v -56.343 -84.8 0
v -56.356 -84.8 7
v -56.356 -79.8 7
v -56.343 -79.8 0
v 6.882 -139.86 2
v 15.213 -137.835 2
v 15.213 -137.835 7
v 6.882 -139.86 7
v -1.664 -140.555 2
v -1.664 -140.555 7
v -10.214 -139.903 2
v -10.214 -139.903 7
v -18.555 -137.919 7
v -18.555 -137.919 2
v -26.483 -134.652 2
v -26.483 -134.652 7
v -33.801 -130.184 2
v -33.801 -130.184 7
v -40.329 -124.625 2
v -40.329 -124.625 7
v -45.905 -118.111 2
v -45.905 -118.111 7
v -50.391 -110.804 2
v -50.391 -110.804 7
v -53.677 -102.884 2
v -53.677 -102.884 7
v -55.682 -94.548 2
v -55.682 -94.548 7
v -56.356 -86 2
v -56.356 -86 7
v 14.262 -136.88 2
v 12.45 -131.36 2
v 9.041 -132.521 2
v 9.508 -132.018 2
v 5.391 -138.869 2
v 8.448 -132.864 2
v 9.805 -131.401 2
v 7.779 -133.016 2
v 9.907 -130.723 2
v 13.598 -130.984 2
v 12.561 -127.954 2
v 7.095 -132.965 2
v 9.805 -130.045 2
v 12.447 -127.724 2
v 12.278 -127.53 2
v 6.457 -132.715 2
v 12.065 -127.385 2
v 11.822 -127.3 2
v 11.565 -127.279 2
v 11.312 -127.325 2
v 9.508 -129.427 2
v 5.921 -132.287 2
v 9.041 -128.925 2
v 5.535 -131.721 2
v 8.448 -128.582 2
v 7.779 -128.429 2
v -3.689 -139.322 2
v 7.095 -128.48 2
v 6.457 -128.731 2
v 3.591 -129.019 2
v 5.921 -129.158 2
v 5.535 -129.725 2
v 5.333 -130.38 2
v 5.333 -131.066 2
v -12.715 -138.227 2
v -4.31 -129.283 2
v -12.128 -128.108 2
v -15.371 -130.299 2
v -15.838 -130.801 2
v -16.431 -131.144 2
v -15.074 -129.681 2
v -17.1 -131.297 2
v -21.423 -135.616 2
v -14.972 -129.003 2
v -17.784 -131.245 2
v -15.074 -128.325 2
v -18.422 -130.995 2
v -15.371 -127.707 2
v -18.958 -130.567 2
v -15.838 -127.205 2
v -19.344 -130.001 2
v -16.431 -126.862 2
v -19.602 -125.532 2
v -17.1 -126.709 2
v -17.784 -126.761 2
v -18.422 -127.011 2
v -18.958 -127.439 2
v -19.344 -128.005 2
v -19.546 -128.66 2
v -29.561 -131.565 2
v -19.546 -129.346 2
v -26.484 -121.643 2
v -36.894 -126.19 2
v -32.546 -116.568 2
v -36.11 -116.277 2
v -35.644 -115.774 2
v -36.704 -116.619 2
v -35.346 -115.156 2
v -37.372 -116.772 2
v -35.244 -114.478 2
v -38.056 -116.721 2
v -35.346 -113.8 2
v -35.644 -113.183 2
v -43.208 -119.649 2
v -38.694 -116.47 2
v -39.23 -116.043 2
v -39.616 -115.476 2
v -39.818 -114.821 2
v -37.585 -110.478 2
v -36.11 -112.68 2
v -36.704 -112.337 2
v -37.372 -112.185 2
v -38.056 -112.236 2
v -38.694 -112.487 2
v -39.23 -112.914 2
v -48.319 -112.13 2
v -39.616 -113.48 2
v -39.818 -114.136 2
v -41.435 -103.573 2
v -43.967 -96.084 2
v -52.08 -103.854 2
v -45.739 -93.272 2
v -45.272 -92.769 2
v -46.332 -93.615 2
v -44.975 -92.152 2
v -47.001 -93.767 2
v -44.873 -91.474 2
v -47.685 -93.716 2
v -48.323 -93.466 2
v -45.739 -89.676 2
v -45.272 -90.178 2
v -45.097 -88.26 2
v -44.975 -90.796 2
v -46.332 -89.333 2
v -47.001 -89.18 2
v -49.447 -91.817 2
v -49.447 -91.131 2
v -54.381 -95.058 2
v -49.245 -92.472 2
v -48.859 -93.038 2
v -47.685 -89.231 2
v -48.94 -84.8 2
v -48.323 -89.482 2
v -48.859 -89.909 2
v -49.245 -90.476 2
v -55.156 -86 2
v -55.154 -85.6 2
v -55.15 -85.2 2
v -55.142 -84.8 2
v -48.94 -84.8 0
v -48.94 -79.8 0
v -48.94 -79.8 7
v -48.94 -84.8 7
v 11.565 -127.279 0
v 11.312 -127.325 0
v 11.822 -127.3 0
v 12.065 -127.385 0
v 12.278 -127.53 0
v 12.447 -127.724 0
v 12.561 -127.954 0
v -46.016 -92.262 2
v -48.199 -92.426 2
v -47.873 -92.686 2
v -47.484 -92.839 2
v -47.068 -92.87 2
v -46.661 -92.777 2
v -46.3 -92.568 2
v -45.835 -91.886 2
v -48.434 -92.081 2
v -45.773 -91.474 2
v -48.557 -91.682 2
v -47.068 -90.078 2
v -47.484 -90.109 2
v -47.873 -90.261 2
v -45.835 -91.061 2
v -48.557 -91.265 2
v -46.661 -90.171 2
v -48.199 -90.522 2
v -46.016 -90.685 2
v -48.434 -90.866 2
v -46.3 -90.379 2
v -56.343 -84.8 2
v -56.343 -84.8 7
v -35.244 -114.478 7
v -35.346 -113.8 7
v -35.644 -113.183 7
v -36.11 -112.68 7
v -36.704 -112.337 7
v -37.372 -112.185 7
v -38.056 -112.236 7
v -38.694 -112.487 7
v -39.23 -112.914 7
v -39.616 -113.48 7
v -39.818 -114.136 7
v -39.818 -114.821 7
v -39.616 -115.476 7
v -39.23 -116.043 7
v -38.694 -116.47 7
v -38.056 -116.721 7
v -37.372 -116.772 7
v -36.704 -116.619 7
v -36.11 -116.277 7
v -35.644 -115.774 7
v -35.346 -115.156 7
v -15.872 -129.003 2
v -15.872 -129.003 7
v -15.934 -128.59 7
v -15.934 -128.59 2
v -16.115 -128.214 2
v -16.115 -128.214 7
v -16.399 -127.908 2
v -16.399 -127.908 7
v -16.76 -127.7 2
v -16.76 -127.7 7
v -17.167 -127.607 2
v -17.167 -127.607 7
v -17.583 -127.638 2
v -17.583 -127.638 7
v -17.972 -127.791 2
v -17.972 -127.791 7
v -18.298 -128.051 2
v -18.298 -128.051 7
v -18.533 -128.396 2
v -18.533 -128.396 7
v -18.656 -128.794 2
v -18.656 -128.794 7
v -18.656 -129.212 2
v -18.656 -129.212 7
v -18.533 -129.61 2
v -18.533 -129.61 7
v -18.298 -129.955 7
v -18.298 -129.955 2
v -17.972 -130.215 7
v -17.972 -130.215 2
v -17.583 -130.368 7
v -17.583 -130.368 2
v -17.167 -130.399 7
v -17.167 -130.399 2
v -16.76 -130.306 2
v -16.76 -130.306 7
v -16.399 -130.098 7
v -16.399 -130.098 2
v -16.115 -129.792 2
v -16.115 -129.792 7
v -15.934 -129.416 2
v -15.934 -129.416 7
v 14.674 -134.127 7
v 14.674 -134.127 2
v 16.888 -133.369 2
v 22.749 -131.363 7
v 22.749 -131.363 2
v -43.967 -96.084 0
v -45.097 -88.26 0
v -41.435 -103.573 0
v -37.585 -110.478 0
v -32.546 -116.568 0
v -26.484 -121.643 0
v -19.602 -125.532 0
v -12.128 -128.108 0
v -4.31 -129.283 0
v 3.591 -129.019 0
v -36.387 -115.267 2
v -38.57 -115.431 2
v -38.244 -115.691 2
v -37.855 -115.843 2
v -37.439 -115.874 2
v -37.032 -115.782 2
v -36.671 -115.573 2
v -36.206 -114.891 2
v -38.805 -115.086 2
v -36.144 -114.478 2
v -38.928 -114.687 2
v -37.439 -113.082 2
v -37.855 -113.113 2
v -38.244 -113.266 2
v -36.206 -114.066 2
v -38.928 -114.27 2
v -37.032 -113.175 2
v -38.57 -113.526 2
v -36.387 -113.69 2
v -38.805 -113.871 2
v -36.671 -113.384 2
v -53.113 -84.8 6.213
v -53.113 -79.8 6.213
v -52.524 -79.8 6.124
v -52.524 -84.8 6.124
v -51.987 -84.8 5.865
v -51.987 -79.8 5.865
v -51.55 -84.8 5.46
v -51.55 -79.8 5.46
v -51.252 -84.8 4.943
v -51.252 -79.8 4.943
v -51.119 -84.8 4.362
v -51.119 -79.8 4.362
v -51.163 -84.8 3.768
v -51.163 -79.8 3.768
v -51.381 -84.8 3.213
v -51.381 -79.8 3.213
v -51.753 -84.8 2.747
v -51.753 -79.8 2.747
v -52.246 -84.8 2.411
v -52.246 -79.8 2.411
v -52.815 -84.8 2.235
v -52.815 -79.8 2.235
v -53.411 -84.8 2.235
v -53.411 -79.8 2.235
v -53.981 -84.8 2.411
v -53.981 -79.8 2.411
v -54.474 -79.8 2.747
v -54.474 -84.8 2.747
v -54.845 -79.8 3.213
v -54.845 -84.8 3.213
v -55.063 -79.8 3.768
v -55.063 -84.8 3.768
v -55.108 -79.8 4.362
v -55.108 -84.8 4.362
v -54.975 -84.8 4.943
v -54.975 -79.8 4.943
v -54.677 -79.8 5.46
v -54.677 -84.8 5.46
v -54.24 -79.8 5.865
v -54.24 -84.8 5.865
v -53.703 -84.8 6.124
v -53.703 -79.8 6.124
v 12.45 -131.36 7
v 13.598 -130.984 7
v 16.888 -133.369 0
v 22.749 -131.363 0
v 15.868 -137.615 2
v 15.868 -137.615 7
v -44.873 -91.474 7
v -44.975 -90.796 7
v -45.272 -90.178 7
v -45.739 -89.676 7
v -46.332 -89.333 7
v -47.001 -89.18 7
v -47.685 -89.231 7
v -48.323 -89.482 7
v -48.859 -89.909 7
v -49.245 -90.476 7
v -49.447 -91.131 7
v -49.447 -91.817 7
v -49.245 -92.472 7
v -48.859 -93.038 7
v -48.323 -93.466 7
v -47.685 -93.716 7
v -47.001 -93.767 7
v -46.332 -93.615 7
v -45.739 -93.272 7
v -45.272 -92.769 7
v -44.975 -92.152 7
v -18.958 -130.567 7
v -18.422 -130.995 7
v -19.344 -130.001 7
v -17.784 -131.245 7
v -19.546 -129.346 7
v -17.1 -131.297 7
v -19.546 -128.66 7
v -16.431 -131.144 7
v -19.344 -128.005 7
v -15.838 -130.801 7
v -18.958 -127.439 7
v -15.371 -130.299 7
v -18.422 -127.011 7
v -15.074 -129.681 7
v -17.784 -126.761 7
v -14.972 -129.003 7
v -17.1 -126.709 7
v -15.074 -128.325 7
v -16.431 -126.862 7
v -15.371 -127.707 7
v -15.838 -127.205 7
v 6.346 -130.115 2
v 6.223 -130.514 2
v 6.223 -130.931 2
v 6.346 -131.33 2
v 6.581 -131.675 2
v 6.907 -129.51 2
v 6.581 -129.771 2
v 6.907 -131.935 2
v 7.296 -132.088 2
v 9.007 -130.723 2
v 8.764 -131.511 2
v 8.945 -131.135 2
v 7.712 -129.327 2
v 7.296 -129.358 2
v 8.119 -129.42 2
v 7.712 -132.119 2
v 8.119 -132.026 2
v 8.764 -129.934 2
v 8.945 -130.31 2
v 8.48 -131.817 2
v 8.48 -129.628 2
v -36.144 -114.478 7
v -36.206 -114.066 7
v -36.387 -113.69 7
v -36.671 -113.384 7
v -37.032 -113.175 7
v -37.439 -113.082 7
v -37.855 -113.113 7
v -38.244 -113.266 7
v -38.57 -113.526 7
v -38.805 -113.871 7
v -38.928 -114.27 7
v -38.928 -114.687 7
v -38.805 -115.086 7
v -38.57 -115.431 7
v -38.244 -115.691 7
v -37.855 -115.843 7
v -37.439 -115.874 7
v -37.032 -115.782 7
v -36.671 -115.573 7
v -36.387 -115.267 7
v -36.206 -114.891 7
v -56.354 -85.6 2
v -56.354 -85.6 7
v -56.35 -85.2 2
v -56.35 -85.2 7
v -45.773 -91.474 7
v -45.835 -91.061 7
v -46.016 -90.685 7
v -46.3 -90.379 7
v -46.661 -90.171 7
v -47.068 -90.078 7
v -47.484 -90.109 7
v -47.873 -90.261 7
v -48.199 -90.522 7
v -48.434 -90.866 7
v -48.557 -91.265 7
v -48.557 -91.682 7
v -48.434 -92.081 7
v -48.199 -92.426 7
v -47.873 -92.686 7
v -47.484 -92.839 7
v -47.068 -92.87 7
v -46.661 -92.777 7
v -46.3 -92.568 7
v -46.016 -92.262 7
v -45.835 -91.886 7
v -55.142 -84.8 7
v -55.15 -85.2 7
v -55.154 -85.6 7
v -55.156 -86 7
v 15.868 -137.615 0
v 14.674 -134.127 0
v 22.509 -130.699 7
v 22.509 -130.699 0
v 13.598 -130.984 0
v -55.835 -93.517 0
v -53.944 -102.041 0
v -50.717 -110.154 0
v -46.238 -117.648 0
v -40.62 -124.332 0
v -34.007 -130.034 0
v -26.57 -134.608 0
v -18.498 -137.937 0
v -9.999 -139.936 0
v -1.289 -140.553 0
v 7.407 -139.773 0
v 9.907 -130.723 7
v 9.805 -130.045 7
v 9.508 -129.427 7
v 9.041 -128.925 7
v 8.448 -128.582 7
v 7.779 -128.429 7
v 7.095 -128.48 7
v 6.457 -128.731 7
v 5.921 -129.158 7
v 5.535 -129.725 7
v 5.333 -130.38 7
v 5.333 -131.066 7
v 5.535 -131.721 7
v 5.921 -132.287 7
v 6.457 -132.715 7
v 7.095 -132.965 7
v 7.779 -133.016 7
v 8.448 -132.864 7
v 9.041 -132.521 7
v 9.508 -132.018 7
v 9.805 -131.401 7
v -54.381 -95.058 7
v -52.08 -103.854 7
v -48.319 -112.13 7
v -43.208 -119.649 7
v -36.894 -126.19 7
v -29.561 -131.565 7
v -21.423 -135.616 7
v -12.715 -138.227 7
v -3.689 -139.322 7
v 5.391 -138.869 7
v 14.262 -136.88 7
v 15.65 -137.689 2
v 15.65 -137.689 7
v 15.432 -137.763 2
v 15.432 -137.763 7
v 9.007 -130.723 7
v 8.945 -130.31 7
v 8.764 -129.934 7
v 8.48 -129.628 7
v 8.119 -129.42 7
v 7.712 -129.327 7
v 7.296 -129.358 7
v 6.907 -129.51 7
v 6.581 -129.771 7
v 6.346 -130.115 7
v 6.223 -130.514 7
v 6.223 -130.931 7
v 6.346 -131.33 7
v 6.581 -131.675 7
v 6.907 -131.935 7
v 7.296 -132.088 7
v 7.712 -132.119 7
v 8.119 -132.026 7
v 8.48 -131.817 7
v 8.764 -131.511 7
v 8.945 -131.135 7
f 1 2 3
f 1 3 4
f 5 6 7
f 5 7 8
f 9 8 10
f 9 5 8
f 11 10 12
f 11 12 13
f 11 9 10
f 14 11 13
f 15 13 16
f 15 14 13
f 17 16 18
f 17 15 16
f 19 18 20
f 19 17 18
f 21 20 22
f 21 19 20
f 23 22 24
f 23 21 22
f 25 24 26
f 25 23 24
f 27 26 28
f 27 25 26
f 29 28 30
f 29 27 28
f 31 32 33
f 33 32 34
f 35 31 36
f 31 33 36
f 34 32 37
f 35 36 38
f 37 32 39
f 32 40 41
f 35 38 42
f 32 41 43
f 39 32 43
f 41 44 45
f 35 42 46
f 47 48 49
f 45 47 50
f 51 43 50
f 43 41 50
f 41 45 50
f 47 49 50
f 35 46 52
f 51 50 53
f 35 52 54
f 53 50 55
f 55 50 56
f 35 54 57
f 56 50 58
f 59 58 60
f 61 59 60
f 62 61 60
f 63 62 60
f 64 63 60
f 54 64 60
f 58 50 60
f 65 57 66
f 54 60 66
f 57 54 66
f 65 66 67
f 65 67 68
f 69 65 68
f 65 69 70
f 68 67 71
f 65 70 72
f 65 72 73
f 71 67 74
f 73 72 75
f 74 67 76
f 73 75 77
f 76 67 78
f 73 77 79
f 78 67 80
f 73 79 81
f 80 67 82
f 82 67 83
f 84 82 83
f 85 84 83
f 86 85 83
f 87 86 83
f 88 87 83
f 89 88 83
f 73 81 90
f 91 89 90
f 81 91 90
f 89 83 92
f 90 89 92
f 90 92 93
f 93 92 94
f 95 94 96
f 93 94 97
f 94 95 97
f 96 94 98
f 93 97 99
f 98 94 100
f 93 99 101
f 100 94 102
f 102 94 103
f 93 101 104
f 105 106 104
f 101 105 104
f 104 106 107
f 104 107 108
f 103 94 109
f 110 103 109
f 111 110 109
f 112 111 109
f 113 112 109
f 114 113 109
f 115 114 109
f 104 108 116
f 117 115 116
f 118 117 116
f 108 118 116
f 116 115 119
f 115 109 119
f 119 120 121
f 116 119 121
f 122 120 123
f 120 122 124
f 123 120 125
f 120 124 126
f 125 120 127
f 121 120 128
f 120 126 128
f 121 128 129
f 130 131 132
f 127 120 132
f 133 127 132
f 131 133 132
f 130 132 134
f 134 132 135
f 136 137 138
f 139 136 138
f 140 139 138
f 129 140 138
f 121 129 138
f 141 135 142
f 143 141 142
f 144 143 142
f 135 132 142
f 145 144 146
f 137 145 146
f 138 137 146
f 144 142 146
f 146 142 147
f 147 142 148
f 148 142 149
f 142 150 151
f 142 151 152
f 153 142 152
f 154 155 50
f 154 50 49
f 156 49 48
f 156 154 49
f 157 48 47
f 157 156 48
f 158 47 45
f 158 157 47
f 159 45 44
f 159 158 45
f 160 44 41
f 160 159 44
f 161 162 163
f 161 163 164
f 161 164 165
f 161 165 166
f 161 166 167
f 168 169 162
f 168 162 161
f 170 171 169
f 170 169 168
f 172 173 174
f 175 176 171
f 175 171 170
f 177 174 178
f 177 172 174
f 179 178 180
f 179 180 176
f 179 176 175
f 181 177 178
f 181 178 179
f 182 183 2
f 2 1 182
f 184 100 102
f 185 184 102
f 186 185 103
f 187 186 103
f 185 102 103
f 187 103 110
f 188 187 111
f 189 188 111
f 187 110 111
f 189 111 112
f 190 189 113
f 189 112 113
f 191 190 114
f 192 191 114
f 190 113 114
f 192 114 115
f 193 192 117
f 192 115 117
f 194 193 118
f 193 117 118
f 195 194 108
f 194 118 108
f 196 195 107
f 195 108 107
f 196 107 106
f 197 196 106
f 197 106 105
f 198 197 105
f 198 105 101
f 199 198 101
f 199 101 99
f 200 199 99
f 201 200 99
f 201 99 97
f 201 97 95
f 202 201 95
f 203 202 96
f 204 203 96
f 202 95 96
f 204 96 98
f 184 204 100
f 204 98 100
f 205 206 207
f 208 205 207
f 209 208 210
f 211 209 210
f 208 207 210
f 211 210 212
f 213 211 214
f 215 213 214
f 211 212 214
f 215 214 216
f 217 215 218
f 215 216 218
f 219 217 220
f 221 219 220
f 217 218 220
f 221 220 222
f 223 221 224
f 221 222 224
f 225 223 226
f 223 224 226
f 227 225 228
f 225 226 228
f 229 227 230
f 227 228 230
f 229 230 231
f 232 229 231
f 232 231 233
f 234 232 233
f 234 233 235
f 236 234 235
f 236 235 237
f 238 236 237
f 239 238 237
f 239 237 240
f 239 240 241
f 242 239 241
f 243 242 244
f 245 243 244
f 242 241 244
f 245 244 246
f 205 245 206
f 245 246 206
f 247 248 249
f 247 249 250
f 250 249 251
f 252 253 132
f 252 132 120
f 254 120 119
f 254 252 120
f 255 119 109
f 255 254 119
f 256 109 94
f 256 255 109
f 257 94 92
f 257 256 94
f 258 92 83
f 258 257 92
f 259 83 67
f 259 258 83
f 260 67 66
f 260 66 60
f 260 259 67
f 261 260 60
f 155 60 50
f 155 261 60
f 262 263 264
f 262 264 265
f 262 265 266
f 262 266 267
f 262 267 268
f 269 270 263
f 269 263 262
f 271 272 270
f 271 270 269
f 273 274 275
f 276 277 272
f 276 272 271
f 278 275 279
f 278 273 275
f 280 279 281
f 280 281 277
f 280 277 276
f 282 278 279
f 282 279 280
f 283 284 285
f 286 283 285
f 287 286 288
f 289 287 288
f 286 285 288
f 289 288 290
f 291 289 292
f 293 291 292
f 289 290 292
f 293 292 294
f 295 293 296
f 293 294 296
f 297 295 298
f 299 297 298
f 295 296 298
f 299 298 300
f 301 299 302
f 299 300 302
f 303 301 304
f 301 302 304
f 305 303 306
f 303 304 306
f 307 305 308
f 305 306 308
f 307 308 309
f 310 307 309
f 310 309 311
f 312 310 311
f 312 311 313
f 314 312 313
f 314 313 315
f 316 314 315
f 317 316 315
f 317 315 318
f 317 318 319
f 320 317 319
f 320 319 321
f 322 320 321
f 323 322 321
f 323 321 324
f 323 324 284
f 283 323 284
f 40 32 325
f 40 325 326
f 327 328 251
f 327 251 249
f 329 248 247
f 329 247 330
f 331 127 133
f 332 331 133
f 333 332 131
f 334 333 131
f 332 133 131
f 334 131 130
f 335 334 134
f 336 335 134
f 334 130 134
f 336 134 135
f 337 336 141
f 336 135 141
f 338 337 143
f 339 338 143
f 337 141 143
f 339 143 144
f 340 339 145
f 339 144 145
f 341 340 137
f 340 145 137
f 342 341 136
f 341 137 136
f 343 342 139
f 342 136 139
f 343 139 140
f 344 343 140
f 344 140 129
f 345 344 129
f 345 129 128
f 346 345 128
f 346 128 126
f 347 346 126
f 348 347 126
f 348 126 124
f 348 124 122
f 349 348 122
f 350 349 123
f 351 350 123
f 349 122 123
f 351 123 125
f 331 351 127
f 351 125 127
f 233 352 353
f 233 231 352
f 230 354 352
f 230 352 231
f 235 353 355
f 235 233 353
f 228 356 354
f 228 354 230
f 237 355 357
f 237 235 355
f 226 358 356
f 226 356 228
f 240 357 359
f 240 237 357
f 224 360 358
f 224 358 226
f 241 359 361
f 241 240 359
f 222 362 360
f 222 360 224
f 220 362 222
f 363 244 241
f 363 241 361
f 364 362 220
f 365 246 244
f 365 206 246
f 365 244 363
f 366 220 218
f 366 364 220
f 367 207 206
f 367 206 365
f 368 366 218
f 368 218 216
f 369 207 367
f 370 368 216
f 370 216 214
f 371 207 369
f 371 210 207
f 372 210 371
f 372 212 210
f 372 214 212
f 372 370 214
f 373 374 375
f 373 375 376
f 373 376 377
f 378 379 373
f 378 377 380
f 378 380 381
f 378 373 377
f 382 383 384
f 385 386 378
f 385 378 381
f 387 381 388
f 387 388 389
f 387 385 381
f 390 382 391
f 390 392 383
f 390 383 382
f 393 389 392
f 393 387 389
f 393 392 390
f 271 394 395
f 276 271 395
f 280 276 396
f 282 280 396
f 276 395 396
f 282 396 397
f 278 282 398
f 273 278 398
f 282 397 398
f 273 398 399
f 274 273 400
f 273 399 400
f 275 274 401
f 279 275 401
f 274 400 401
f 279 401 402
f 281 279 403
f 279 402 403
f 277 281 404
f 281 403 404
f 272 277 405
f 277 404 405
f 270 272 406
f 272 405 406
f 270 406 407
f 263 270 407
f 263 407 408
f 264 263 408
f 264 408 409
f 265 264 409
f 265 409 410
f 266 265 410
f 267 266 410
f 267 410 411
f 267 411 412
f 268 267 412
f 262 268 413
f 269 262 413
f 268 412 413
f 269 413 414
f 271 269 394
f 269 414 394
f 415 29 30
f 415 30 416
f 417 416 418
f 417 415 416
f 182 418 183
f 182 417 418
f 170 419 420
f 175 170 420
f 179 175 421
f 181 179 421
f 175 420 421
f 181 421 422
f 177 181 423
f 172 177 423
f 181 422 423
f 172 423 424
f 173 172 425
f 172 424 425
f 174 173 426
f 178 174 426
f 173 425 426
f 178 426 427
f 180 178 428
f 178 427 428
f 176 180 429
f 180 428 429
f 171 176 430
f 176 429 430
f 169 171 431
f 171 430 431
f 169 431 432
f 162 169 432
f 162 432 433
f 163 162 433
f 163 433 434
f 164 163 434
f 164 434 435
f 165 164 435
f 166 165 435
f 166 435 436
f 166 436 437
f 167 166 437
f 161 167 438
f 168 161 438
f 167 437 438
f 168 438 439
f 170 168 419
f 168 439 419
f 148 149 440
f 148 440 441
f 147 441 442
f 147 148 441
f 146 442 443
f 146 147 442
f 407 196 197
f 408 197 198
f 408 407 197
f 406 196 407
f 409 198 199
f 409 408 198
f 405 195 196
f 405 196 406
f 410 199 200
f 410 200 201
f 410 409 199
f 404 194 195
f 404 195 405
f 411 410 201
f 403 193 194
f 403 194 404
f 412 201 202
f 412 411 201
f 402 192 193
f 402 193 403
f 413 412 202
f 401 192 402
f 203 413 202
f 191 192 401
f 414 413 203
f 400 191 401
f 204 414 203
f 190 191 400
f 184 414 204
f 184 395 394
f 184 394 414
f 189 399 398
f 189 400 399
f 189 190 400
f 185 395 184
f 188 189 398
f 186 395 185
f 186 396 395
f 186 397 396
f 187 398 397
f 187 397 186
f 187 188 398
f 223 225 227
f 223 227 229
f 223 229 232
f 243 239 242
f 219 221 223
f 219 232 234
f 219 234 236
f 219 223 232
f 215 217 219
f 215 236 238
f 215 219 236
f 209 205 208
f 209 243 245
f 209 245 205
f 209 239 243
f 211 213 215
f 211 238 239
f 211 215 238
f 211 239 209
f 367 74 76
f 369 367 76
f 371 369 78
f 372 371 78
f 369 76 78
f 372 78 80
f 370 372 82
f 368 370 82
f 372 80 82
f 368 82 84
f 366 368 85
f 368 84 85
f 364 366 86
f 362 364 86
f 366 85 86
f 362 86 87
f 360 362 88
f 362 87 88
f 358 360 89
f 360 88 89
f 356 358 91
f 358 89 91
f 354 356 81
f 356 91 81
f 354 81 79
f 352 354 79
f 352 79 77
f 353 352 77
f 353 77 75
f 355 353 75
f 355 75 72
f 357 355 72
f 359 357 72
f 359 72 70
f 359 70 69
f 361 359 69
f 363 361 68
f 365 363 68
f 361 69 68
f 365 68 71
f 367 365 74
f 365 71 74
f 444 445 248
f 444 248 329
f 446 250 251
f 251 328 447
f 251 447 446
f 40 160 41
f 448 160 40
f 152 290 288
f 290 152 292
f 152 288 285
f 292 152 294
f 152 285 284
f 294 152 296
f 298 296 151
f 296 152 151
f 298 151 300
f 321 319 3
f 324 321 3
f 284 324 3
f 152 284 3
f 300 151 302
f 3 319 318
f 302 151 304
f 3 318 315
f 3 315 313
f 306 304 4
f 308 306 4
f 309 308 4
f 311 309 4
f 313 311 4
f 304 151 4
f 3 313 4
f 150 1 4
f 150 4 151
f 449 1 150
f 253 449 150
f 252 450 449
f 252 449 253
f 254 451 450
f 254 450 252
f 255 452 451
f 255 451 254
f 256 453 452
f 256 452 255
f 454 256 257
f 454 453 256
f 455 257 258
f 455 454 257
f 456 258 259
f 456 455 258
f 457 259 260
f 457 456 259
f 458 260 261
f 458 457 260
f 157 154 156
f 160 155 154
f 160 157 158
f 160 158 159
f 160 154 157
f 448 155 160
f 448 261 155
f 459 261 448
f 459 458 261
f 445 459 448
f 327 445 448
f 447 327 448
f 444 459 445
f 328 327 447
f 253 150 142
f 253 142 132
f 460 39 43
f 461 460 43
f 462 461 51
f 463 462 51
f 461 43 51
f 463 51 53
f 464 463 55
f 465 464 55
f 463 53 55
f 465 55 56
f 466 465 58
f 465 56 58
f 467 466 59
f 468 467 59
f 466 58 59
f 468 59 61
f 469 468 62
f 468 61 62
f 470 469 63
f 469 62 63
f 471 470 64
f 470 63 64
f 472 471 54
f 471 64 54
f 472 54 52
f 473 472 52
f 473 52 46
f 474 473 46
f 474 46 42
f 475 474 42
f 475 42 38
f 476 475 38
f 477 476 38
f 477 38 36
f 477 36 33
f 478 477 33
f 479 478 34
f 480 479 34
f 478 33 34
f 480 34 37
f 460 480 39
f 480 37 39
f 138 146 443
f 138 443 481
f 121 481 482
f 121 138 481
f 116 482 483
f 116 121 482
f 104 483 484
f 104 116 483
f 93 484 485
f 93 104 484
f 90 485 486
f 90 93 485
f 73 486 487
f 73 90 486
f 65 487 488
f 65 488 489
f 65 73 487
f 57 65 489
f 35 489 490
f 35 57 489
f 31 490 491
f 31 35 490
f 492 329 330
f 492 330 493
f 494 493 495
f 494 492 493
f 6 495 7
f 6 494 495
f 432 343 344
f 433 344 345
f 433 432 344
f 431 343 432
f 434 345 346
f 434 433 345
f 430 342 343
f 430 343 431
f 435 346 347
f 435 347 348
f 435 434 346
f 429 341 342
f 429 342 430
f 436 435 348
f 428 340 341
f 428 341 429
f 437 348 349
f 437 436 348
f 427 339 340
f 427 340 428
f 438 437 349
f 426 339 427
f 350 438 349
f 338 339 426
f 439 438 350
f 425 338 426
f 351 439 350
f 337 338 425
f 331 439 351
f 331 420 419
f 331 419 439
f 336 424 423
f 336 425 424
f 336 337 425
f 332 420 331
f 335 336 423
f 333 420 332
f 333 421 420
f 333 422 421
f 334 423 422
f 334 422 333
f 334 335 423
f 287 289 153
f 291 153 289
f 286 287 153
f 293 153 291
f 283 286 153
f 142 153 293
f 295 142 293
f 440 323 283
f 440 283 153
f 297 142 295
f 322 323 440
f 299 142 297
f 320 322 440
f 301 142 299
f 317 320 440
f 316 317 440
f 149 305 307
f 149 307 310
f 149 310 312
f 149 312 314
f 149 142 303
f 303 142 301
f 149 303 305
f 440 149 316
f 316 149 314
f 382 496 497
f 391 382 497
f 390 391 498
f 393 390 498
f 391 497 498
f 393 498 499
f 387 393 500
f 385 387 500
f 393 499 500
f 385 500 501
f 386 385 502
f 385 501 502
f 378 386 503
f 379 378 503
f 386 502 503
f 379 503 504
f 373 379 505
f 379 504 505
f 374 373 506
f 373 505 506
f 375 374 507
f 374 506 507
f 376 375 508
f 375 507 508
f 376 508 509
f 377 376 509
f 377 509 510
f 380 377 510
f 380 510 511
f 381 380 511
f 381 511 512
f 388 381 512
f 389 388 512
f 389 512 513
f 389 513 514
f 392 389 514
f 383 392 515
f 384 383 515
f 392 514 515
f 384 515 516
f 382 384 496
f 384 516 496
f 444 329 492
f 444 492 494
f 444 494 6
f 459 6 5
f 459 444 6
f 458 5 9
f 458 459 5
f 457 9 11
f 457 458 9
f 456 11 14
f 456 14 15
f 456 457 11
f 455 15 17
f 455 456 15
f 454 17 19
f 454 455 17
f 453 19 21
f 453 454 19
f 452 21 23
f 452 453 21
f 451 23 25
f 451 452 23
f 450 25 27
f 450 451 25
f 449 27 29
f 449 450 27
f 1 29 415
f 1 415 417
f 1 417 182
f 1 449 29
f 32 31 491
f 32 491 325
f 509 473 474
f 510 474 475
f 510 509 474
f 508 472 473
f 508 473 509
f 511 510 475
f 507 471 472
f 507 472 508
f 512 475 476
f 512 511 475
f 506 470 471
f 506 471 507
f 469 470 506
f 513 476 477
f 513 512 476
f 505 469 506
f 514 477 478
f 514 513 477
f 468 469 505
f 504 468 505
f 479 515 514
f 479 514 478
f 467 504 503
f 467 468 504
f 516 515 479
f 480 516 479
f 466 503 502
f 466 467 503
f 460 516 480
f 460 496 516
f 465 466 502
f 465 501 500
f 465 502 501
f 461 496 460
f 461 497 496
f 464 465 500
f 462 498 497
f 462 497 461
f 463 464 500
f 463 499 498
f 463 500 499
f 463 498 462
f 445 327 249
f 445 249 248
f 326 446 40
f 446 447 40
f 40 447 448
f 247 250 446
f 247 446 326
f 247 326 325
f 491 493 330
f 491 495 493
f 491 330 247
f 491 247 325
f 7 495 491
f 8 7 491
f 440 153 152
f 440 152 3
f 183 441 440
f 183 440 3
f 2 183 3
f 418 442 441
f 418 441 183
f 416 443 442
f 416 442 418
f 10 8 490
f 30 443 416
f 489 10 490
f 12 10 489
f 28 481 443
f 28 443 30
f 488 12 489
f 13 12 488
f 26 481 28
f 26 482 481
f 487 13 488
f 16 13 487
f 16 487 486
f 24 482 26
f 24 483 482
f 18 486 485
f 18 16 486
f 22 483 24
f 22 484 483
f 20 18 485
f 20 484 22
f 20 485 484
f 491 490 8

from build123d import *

# Parameters (mm, degrees)
BOSS_EXTRUDE1_DEPTH = 2
BOSS_EXTRUDE2_DEPTH = 5
SKETCH3_R           = 2.3
BOSS_EXTRUDE3_DEPTH = 5
BOSS_EXTRUDE4_DEPTH = 5
SKETCH6_R           = 1.4
CUT_EXTRUDE1_DEPTH  = 5
SKETCH7_R           = 2
CUT_EXTRUDE2_DEPTH  = 8


with BuildPart() as part:
    # Sketch1 → Boss-Extrude1 (new body)
    with BuildSketch(Plane.XY):
        with BuildLine():
            Line((16.887910555, -133.369322594), (14.673679255, -134.127250965))
            Line((14.673679255, -134.127250965), (15.867669408, -137.615404294))
            ThreePointArc((15.867669408, -137.615404294), (-34.007319131, -130.034150274), (-56.342527733, -84.8))
            Line((-56.342527733, -84.8), (-48.940455795, -84.8))
            Line((-48.940455795, -84.8), (-45.096768624, -88.26027792))
            ThreePointArc((-45.096768624, -88.26027792), (-26.483938318, -121.642871269), (11.312186404, -127.325119655))
            ThreePointArc((11.312186404, -127.325119655), (12.064722619, -127.385308804), (12.560733381, -127.954436921))
            Line((12.560733381, -127.954436921), (13.597675192, -130.983785211))
            Line((13.597675192, -130.983785211), (22.508911342, -130.69915726))
            Line((22.508911342, -130.69915726), (22.749464344, -131.362920683))
            Line((22.749464344, -131.362920683), (16.887910555, -133.369322594))
        make_face()
    extrude(amount=BOSS_EXTRUDE1_DEPTH)

    # Sketch2 → Boss-Extrude2 (add)
    with BuildSketch(Plane.XY.offset(2)):
        with BuildLine():
            Line((-56.342527733, -84.8), (-55.142230801, -84.8))
            ThreePointArc((-55.142230801, -84.8), (-55.152352766, -85.399962054), (-55.155726896, -86))
            ThreePointArc((-55.155726896, -86), (-33.342347458, -129.033761126), (14.261826326, -136.880464731))
            Line((14.261826326, -136.880464731), (12.45002618, -131.36047245))
            Line((12.45002618, -131.36047245), (13.597675192, -130.983785211))
            Line((13.597675192, -130.983785211), (15.867669408, -137.615404294))
            ThreePointArc((15.867669408, -137.615404294), (15.540815193, -137.726132378), (15.21326709, -137.834790682))
            ThreePointArc((15.21326709, -137.834790682), (-33.801189066, -130.184178235), (-56.355726896, -86))
            ThreePointArc((-56.355726896, -86), (-56.352427006, -85.399963706), (-56.342527733, -84.8))
        make_face()
    extrude(amount=BOSS_EXTRUDE2_DEPTH)

    # Sketch3 → Boss-Extrude3 (add)
    with BuildSketch(Plane.XY.offset(2)):
        with Locations((7.607262335, -130.722795016)):
            Circle(SKETCH3_R)
        with Locations((-17.271773957, -129.003020951)):
            Circle(SKETCH3_R)
        with Locations((-37.543895432, -114.478381178)):
            Circle(SKETCH3_R)
        with Locations((-47.172740285, -91.473829097)):
            Circle(SKETCH3_R)
        Polygon((14.673679255, -134.127250965), (22.749464344, -131.362920683), (22.508911342, -130.69915726), (13.597675192, -130.983785211), align=None)
    extrude(amount=BOSS_EXTRUDE3_DEPTH)

    # Sketch4 → Boss-Extrude4 (add)
    with BuildSketch(Plane(origin=(0, -84.8, 0), x_dir=(1, 0, 0), z_dir=(0, 1, 0))):
        Polygon((-56.342527733, 0), (-48.940455795, 0), (-48.940455795, -7), (-56.355726896, -7), align=None)
    extrude(amount=BOSS_EXTRUDE4_DEPTH)

    # Sketch6 → Cut-Extrude1 (cut)
    with BuildSketch(Plane.XY.offset(7)):
        with Locations((-47.172740285, -91.473829097)):
            Circle(SKETCH6_R)
        with Locations((-37.543895432, -114.478381178)):
            Circle(SKETCH6_R)
        with Locations((-17.271773957, -129.003020951)):
            Circle(SKETCH6_R)
        with Locations((7.607262335, -130.722795016)):
            Circle(SKETCH6_R)
    extrude(amount=-CUT_EXTRUDE1_DEPTH, mode=Mode.SUBTRACT)

    # Sketch7 → Cut-Extrude2 (cut)
    with BuildSketch(Plane(origin=(0, -79.8, 0), x_dir=(1, 0, 0), z_dir=(0, 1, 0))):
        with Locations(Location((-53.113278602, -4.212750817, 0), (0, 0, 270))):
            Circle(SKETCH7_R)
    extrude(amount=-CUT_EXTRUDE2_DEPTH, mode=Mode.SUBTRACT)


solid = part.part
